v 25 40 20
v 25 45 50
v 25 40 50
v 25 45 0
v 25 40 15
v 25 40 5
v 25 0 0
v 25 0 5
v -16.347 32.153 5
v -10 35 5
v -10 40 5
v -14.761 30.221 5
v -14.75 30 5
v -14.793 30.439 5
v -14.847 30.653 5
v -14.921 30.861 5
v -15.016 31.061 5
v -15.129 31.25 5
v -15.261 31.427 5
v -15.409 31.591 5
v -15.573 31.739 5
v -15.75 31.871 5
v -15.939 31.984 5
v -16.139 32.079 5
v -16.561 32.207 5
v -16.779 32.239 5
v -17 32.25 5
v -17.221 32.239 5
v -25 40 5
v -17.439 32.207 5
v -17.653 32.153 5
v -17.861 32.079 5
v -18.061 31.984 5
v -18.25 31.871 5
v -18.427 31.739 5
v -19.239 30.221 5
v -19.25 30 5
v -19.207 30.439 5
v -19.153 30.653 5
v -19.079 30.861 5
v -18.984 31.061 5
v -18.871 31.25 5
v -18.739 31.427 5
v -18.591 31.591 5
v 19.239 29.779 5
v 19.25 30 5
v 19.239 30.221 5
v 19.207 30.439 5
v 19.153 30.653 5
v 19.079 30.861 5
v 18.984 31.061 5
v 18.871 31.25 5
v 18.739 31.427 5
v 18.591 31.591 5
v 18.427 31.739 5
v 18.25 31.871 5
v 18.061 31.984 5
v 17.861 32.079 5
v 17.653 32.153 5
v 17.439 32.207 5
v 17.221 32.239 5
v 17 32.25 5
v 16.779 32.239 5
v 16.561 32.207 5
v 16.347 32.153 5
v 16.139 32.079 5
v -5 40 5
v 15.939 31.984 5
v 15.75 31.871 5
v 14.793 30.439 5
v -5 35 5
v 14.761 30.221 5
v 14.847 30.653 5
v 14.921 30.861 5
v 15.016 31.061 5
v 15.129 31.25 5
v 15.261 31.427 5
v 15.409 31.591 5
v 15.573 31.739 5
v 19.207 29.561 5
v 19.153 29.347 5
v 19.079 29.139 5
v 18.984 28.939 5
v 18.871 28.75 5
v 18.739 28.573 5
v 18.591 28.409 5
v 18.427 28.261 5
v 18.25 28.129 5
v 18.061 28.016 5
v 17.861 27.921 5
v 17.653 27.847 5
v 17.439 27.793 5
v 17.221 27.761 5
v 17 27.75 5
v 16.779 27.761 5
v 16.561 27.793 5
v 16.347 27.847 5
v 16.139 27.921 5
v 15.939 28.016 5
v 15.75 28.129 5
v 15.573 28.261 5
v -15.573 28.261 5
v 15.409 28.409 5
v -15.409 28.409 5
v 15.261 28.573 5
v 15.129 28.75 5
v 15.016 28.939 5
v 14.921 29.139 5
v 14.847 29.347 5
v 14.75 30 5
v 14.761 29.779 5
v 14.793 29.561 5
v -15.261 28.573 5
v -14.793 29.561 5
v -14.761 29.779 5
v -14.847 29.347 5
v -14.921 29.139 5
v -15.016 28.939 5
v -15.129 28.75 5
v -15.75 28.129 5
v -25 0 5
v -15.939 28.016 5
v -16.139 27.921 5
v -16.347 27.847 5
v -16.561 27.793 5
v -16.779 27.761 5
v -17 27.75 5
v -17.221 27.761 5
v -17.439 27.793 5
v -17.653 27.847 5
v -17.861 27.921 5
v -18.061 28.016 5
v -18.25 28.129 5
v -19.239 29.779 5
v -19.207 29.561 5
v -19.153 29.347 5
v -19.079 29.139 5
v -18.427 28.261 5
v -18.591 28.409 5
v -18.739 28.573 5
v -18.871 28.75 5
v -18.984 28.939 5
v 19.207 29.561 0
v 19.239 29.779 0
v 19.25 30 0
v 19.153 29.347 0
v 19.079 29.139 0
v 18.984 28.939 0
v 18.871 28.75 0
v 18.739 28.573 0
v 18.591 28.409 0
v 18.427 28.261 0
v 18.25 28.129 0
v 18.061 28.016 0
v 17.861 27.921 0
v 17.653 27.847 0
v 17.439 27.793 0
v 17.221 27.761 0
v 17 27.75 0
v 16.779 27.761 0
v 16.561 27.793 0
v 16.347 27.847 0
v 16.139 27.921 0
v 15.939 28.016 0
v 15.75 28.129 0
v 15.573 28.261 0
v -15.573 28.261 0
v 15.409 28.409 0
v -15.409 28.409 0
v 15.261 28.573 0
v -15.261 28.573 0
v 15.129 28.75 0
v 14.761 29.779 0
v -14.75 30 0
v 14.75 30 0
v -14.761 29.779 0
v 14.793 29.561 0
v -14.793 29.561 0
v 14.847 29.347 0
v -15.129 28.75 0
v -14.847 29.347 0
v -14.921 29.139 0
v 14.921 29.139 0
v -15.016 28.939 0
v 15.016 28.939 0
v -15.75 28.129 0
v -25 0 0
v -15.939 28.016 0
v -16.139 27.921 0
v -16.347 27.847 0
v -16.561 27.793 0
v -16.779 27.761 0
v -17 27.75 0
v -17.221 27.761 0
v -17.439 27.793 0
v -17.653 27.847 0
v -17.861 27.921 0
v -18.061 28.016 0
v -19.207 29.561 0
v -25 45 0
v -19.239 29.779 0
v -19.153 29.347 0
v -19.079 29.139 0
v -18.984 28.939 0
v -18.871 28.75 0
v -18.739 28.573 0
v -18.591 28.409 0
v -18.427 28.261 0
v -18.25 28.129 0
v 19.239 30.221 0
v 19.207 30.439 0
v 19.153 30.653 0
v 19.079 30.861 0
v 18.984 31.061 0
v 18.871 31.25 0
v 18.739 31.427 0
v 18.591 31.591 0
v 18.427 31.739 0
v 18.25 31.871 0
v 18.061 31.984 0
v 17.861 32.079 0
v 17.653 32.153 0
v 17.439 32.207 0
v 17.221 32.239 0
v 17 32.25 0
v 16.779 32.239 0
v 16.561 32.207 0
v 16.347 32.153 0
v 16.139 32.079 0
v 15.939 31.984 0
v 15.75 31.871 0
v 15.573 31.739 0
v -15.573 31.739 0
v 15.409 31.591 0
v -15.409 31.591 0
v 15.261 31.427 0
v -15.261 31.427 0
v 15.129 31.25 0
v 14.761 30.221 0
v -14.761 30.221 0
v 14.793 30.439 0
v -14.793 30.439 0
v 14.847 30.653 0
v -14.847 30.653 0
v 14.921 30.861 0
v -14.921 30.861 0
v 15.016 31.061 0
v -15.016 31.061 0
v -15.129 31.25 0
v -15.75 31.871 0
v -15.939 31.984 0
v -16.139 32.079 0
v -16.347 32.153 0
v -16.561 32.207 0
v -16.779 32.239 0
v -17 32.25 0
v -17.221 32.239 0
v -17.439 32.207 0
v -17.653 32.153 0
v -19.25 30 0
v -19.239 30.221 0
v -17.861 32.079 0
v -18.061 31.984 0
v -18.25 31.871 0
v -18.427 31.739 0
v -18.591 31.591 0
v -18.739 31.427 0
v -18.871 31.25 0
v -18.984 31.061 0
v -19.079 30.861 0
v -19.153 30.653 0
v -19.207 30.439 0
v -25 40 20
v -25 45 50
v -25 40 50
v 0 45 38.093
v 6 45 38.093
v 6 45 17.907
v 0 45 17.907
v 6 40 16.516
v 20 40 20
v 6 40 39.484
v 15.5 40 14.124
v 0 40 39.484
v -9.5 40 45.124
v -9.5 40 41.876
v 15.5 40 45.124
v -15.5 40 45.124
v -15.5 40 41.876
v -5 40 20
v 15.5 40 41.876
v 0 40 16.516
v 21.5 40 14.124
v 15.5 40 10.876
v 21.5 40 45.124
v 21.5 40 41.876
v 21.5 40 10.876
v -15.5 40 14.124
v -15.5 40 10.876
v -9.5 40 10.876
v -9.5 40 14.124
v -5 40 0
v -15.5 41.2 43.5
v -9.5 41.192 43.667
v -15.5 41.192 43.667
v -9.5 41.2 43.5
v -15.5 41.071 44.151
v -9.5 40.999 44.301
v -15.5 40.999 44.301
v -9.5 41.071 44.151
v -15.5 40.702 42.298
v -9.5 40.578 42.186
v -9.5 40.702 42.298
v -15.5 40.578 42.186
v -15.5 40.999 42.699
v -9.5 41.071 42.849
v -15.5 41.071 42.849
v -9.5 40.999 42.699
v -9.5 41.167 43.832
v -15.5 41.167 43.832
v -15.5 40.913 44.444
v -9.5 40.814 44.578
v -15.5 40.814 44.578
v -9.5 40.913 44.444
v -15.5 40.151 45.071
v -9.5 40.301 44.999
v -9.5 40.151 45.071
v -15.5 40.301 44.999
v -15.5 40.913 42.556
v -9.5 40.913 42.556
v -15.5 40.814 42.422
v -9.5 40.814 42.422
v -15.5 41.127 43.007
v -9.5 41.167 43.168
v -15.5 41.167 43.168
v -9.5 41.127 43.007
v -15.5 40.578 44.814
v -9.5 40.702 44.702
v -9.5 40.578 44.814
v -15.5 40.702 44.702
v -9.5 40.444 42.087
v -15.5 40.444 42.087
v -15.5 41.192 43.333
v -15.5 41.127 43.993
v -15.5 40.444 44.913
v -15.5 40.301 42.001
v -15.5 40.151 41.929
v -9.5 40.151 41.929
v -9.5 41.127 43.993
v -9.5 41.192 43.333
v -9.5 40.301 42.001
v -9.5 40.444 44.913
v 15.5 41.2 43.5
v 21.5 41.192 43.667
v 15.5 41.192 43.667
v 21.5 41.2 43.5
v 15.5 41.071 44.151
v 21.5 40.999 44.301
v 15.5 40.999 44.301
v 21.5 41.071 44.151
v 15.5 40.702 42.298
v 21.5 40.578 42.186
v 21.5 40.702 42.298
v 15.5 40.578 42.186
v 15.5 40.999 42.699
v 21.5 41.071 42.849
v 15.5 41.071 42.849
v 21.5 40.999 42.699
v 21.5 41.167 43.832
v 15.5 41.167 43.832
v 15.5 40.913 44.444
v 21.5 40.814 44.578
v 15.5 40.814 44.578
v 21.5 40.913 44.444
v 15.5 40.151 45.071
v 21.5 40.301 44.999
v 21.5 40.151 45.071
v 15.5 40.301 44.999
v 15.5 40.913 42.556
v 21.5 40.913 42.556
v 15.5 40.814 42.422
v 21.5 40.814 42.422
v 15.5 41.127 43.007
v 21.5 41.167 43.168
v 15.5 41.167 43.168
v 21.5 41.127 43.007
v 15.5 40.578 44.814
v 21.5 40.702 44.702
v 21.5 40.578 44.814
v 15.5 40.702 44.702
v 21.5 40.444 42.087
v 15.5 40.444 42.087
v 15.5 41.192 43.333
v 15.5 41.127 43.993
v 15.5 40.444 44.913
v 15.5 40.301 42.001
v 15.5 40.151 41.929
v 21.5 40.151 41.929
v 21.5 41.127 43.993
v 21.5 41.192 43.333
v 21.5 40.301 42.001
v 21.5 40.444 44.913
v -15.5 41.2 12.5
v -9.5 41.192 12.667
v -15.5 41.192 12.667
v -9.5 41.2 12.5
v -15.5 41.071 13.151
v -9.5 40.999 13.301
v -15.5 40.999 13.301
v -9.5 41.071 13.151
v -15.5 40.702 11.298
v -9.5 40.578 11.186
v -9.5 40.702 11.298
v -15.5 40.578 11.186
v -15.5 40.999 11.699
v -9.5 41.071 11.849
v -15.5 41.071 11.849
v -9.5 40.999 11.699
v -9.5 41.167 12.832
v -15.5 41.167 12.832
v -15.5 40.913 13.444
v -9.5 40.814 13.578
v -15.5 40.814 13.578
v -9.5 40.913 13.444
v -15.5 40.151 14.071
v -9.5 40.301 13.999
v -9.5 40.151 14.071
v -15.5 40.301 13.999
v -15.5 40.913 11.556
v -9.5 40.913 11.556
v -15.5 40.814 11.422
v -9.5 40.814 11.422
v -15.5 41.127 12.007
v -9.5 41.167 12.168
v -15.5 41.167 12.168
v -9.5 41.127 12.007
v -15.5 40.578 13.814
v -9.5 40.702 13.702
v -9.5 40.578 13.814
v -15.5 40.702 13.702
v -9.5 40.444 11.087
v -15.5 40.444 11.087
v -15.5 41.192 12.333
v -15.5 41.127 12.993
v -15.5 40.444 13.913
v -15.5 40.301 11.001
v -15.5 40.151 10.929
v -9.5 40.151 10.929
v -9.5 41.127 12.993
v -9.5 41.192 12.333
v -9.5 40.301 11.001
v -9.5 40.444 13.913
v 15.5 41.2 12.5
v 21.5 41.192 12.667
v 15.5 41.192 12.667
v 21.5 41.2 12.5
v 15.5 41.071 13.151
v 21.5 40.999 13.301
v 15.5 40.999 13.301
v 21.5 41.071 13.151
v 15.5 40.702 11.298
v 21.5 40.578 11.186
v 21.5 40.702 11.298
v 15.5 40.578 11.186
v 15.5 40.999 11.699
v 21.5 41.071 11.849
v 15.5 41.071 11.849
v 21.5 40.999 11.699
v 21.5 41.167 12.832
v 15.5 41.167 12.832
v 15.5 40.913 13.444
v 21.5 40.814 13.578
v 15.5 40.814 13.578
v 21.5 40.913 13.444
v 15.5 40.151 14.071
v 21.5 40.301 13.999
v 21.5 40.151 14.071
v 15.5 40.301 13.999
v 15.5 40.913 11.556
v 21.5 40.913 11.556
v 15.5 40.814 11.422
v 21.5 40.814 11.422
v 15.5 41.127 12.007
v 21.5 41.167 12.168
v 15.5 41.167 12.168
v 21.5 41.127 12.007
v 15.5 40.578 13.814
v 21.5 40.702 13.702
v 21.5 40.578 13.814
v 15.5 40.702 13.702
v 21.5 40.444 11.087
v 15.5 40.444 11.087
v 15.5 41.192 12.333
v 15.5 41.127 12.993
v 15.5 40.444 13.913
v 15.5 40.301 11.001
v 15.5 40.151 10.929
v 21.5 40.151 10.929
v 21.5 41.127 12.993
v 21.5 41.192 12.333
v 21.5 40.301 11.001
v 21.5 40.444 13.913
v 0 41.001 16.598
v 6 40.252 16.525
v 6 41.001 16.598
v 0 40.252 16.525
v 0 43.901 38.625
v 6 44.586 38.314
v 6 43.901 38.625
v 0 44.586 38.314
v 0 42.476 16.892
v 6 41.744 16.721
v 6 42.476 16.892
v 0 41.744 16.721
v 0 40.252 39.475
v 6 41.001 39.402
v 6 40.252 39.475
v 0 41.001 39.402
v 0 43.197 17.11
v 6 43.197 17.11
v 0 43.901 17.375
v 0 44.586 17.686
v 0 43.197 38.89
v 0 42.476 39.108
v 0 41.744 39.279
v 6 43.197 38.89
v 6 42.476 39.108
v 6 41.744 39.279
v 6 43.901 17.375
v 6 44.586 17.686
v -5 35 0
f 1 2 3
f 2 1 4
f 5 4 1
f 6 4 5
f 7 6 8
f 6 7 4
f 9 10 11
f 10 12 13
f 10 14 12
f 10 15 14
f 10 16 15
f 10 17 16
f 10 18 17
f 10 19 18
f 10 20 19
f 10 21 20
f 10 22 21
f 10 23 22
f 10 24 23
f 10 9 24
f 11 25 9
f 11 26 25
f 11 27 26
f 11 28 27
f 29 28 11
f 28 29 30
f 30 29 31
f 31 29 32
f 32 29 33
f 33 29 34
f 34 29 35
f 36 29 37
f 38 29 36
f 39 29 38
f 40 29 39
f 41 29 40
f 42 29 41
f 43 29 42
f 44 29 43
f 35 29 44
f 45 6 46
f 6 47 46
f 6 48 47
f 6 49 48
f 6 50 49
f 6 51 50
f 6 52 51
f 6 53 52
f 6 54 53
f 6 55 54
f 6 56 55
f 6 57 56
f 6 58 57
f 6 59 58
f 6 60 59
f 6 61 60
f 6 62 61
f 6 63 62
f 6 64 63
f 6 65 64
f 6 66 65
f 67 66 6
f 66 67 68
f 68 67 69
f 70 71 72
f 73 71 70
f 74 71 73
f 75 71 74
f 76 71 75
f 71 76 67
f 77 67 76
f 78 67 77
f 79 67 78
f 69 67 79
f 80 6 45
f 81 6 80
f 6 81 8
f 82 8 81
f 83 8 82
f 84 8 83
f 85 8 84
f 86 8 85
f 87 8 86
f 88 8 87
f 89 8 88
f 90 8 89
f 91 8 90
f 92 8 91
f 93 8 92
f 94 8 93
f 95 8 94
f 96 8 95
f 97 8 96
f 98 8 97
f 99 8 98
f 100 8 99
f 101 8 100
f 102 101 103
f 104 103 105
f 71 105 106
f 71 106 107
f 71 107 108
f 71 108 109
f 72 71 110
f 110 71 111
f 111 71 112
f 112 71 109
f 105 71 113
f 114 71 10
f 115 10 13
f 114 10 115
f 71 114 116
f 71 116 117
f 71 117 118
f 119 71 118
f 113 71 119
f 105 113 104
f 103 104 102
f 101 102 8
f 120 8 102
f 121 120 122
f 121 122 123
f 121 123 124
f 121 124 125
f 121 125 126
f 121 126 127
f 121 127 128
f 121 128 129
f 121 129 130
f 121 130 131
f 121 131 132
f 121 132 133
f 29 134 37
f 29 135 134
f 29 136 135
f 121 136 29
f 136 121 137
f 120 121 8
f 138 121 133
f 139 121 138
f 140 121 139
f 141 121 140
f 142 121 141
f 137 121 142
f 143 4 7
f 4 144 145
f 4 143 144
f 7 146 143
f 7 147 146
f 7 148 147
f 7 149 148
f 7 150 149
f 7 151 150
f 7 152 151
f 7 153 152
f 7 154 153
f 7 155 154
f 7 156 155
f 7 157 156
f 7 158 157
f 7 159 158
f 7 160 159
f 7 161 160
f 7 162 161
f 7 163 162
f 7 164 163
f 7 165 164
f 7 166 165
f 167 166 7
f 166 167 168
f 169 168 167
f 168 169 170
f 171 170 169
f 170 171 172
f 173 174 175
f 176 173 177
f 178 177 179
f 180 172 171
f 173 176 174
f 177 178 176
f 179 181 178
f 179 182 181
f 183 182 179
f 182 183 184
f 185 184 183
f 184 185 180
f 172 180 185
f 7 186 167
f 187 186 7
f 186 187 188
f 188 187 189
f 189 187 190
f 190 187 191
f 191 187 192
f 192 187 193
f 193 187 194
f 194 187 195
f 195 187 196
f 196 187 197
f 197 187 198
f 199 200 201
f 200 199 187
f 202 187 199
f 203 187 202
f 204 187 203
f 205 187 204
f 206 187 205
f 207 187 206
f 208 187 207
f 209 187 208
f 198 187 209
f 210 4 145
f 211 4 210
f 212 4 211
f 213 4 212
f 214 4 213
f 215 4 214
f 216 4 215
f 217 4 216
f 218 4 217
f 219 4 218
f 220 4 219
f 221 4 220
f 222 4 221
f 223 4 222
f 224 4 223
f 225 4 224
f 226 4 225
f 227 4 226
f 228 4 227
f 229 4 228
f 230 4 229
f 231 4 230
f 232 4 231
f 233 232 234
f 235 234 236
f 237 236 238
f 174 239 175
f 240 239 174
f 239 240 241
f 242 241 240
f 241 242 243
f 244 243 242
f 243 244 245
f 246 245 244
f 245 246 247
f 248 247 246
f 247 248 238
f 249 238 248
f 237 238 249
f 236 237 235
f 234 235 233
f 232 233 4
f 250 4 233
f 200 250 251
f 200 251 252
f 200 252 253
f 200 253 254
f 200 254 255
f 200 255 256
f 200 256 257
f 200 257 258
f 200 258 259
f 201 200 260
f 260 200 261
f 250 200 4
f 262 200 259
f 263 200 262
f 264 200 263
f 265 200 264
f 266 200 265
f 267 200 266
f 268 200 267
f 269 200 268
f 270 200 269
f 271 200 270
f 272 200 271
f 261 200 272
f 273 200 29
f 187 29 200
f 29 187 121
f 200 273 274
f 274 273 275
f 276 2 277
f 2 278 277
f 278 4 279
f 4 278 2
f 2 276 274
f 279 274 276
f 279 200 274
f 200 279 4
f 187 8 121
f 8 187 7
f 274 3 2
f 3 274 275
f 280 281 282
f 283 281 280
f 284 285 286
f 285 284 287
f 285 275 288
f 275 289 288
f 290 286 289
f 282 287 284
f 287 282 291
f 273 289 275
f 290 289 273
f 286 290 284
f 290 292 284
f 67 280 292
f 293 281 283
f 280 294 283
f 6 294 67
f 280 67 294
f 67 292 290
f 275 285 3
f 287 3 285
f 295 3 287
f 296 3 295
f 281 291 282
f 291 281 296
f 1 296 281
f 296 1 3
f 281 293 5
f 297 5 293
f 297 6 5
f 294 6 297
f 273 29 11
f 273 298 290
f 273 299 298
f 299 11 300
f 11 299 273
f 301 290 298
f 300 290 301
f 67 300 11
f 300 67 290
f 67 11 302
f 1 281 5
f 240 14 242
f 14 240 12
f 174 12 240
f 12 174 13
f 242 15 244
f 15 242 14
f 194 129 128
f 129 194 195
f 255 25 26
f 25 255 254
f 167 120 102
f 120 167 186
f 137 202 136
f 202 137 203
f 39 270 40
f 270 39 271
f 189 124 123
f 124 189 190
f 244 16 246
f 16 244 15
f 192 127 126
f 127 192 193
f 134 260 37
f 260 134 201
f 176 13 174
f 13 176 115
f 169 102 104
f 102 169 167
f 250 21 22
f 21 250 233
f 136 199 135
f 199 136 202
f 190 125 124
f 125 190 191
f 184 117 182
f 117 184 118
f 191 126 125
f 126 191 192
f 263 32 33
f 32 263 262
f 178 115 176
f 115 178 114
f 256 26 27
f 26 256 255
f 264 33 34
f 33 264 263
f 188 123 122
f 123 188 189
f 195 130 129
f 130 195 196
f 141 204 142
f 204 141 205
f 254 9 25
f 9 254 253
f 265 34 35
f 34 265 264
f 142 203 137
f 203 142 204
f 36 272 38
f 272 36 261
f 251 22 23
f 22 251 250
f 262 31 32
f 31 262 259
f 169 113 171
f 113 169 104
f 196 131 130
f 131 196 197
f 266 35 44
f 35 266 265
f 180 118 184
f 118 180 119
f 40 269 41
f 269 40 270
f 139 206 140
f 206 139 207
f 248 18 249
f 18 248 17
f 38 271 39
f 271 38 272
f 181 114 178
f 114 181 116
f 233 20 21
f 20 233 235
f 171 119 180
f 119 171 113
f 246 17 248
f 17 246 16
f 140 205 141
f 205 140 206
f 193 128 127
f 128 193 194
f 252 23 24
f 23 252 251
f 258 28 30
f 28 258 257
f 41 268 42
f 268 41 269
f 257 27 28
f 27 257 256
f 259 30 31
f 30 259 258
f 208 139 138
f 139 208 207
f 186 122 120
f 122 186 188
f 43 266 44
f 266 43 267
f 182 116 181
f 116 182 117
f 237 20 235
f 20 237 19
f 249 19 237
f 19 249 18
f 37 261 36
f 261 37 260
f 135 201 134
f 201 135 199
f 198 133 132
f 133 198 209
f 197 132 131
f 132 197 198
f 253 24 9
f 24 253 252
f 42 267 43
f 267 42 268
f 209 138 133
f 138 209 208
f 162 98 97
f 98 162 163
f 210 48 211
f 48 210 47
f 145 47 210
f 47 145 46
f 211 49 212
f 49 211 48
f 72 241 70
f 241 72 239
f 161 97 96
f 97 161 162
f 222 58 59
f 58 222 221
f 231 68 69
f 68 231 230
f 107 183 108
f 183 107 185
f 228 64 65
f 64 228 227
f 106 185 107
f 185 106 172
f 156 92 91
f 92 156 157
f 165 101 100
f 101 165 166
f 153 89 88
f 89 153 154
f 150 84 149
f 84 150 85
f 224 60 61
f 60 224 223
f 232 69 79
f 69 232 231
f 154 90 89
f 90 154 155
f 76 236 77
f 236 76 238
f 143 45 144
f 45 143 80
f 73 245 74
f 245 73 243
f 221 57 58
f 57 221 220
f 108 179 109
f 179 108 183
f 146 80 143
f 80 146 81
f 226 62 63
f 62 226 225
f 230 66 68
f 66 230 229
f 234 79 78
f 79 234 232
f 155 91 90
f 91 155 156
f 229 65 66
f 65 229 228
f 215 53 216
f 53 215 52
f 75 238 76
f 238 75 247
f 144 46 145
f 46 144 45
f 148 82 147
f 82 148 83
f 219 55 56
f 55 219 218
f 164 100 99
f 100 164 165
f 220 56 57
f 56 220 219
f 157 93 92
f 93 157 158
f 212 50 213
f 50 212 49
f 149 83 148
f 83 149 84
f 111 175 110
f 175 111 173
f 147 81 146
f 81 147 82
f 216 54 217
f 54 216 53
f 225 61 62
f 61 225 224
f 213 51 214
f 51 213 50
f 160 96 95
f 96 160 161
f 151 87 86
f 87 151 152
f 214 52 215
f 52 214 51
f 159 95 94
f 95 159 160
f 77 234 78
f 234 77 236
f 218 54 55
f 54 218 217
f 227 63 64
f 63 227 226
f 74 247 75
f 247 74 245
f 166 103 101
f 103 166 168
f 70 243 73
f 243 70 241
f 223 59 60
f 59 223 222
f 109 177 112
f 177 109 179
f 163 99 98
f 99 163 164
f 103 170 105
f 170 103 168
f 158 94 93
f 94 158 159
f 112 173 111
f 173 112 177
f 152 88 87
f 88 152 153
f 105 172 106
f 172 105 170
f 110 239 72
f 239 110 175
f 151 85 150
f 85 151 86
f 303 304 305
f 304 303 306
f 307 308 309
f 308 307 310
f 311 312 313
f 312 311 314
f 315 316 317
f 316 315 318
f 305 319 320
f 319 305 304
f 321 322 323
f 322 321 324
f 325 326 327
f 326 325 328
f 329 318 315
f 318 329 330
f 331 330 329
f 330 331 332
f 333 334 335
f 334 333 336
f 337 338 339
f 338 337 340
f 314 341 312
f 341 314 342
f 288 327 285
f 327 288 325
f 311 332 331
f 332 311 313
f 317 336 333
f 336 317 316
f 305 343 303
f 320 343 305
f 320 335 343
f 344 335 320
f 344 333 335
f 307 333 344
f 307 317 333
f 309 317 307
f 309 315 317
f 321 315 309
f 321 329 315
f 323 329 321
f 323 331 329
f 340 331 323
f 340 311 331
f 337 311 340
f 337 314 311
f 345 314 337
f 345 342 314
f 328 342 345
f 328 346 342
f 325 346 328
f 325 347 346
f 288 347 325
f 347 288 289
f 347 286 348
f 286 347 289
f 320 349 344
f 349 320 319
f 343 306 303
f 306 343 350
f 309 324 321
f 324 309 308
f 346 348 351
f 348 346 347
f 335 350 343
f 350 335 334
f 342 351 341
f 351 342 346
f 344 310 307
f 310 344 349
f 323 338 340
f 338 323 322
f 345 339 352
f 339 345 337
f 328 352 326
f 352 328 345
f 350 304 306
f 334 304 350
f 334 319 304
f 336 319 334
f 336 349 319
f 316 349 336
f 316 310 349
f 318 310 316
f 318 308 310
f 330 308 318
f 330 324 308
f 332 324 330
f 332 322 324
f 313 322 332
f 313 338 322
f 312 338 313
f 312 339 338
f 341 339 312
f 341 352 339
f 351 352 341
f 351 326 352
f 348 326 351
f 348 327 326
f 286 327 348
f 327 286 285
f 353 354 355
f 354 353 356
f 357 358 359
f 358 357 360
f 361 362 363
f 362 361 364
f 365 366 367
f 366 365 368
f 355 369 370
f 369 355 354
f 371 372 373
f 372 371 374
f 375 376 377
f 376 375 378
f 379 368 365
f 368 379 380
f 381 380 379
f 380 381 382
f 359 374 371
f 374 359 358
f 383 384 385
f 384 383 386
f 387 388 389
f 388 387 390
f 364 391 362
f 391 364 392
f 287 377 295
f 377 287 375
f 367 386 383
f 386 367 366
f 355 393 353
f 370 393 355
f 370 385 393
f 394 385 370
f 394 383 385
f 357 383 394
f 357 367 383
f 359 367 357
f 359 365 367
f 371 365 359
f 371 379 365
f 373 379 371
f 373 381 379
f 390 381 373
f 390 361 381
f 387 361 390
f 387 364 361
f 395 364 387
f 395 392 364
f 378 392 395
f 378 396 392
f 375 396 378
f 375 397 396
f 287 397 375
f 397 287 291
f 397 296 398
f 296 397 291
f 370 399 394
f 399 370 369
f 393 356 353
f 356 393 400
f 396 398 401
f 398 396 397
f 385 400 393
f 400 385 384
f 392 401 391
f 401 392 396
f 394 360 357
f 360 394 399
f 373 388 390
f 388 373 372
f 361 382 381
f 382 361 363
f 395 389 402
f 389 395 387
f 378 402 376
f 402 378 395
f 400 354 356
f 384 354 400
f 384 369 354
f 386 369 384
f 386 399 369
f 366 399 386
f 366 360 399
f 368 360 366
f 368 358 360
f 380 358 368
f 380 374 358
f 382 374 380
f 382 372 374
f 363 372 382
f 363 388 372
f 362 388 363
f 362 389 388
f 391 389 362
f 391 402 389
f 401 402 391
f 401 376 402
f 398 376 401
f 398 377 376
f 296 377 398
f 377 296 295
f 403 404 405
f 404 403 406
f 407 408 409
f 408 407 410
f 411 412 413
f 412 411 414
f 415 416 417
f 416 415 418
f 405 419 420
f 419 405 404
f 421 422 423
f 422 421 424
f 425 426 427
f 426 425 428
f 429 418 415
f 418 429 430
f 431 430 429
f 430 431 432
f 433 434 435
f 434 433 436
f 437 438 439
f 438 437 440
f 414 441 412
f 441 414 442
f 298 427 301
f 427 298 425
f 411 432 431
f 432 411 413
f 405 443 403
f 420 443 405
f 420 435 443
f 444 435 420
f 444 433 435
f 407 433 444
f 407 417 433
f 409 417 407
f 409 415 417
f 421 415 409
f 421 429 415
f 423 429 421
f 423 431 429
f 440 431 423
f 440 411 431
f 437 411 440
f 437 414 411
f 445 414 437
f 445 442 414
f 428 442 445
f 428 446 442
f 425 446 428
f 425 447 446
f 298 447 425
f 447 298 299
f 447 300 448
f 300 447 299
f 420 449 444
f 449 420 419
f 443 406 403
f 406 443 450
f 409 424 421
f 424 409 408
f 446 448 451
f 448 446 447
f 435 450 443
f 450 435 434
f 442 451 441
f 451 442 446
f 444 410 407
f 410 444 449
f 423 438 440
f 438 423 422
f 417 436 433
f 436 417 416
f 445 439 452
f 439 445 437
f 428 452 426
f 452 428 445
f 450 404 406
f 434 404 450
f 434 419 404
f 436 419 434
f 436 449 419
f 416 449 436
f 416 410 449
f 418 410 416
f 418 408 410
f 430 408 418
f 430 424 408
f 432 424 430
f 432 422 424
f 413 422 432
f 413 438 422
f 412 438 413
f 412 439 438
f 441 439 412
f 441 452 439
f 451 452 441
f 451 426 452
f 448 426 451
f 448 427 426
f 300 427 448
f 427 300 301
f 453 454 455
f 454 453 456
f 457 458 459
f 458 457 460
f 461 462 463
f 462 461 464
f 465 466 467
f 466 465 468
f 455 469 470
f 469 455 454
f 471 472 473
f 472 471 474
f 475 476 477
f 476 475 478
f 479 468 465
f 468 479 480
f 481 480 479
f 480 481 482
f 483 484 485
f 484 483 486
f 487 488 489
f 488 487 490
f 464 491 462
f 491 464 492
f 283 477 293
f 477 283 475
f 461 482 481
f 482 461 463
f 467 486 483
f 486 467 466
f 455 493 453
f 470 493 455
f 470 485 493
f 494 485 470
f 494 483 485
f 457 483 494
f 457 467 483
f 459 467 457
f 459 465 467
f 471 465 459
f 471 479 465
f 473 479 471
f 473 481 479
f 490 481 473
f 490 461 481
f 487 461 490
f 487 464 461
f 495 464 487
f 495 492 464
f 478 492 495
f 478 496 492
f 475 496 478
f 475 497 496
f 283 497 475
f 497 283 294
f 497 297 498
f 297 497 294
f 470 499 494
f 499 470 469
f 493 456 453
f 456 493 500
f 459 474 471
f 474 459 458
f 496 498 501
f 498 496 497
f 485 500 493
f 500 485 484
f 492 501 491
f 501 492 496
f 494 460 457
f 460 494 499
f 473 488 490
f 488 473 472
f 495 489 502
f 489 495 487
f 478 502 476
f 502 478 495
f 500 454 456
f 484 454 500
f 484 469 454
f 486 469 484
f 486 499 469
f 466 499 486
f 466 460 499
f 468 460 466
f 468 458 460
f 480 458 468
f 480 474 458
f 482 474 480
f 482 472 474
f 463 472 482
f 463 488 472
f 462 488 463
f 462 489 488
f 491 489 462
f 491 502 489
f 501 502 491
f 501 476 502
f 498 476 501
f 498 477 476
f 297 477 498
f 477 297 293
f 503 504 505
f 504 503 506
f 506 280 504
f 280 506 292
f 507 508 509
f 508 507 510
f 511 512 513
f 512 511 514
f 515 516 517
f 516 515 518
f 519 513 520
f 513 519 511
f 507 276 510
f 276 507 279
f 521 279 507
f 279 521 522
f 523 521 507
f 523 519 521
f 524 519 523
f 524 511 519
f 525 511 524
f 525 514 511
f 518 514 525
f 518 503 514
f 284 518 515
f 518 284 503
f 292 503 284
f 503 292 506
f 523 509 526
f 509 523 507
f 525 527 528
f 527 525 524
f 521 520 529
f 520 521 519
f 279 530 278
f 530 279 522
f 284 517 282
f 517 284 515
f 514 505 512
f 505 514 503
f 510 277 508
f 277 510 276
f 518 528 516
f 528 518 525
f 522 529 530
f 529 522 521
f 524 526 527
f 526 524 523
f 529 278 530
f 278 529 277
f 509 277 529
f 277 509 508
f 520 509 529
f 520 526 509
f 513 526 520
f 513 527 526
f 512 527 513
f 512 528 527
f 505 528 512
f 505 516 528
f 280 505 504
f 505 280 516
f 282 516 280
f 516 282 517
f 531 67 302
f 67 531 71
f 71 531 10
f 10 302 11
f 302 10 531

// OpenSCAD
// L-shaped mounting bracket for a NEMA 17 stepper motor
// Print orientation: base plate lies on the bed (z = 0), vertical plate builds upward.

// ---------------- Parameters ----------------
plate_x      = 25;    // base plate: x from -25 to 25 (mm)
plate_y      = 45;    // base plate: y from 0 to 45 (mm)
plate_t      = 5;     // base plate thickness (mm)

motor_x      = 25;    // motor plate: x from -25 to 25 (mm)
motor_y      = 5;     // motor plate: y from 0 to 5 (mm)
motor_h      = 50;    // motor plate height, z from 0 to 50 (mm)

boss_d       = 23;    // motor centring boss hole diameter (mm)
boss_x       = 0;     // boss hole centre x (mm)
boss_z       = 28;    // boss hole centre z (mm)

screw_d      = 3.4;   // M3 screw hole diameter (mm)
screw_pitch  = 31;    // square pattern pitch for screw holes (mm)
screw_count  = 4;     // number of screw holes

gusset_t     = 5;     // gusset thickness along x (mm)
gusset_leg   = 20;    // right-triangle leg length along +y and +Z (mm)

eps          = 0.5;   // cutter overshoot past faces (mm)
$fn          = 96;    // curve resolution

// ---------------- Model ----------------
difference() {
    // ---- Bodies ----
    union() {
        // Base plate
        translate([-plate_x, 0, 0])
            cube([plate_x * 2, plate_y, plate_t]);

        // Vertical motor plate, standing on the back edge of the base
        translate([-motor_x, plate_y - motor_y, 0])
            cube([motor_x * 2, motor_y, motor_h]);
    }

    // ---- Cutouts ----
    // Two vertical through-holes in the base plate
    for (h = [plate_t, plate_t + eps])
        for (sx = [-17, 17])
            for (sy = [30])
                translate([sx, sy, 0])
                    cylinder(d = 4.5, h = h, $fn = 64);

    // Boss hole and screw holes, all through the motor plate along Y
    translate([boss_x, plate_y - motor_y - eps, boss_z])
        rotate([0, 90, 0]) {
            cylinder(d = boss_d, h = motor_y + 2 * eps, $fn = 96);

            // Square pattern centred on the boss hole
            for (i = [-1, 1])
                for (j = [-1, 1])
                    translate([i * screw_pitch / 2, 0, j * screw_pitch / 2])
                        cylinder(d = screw_d, h = motor_y + 2 * eps, $fn = 64);
        }

    // Triangular gussets, flush with the left and right edges
    // Right triangle in YZ: legs along +Y and +Z, right angle at y = 5, z = 5
    for (gx = [-25, 20])
        translate([gx, plate_y - gusset_t, 0])
            rotate([90, 0, 0])
                linear_extrude(height = gusset_t)
                    polygon(points = [
                        [gusset_leg, gusset_leg],
                        [gusset_leg, 0],
                        [0, gusset_leg]
                    ]);
}
